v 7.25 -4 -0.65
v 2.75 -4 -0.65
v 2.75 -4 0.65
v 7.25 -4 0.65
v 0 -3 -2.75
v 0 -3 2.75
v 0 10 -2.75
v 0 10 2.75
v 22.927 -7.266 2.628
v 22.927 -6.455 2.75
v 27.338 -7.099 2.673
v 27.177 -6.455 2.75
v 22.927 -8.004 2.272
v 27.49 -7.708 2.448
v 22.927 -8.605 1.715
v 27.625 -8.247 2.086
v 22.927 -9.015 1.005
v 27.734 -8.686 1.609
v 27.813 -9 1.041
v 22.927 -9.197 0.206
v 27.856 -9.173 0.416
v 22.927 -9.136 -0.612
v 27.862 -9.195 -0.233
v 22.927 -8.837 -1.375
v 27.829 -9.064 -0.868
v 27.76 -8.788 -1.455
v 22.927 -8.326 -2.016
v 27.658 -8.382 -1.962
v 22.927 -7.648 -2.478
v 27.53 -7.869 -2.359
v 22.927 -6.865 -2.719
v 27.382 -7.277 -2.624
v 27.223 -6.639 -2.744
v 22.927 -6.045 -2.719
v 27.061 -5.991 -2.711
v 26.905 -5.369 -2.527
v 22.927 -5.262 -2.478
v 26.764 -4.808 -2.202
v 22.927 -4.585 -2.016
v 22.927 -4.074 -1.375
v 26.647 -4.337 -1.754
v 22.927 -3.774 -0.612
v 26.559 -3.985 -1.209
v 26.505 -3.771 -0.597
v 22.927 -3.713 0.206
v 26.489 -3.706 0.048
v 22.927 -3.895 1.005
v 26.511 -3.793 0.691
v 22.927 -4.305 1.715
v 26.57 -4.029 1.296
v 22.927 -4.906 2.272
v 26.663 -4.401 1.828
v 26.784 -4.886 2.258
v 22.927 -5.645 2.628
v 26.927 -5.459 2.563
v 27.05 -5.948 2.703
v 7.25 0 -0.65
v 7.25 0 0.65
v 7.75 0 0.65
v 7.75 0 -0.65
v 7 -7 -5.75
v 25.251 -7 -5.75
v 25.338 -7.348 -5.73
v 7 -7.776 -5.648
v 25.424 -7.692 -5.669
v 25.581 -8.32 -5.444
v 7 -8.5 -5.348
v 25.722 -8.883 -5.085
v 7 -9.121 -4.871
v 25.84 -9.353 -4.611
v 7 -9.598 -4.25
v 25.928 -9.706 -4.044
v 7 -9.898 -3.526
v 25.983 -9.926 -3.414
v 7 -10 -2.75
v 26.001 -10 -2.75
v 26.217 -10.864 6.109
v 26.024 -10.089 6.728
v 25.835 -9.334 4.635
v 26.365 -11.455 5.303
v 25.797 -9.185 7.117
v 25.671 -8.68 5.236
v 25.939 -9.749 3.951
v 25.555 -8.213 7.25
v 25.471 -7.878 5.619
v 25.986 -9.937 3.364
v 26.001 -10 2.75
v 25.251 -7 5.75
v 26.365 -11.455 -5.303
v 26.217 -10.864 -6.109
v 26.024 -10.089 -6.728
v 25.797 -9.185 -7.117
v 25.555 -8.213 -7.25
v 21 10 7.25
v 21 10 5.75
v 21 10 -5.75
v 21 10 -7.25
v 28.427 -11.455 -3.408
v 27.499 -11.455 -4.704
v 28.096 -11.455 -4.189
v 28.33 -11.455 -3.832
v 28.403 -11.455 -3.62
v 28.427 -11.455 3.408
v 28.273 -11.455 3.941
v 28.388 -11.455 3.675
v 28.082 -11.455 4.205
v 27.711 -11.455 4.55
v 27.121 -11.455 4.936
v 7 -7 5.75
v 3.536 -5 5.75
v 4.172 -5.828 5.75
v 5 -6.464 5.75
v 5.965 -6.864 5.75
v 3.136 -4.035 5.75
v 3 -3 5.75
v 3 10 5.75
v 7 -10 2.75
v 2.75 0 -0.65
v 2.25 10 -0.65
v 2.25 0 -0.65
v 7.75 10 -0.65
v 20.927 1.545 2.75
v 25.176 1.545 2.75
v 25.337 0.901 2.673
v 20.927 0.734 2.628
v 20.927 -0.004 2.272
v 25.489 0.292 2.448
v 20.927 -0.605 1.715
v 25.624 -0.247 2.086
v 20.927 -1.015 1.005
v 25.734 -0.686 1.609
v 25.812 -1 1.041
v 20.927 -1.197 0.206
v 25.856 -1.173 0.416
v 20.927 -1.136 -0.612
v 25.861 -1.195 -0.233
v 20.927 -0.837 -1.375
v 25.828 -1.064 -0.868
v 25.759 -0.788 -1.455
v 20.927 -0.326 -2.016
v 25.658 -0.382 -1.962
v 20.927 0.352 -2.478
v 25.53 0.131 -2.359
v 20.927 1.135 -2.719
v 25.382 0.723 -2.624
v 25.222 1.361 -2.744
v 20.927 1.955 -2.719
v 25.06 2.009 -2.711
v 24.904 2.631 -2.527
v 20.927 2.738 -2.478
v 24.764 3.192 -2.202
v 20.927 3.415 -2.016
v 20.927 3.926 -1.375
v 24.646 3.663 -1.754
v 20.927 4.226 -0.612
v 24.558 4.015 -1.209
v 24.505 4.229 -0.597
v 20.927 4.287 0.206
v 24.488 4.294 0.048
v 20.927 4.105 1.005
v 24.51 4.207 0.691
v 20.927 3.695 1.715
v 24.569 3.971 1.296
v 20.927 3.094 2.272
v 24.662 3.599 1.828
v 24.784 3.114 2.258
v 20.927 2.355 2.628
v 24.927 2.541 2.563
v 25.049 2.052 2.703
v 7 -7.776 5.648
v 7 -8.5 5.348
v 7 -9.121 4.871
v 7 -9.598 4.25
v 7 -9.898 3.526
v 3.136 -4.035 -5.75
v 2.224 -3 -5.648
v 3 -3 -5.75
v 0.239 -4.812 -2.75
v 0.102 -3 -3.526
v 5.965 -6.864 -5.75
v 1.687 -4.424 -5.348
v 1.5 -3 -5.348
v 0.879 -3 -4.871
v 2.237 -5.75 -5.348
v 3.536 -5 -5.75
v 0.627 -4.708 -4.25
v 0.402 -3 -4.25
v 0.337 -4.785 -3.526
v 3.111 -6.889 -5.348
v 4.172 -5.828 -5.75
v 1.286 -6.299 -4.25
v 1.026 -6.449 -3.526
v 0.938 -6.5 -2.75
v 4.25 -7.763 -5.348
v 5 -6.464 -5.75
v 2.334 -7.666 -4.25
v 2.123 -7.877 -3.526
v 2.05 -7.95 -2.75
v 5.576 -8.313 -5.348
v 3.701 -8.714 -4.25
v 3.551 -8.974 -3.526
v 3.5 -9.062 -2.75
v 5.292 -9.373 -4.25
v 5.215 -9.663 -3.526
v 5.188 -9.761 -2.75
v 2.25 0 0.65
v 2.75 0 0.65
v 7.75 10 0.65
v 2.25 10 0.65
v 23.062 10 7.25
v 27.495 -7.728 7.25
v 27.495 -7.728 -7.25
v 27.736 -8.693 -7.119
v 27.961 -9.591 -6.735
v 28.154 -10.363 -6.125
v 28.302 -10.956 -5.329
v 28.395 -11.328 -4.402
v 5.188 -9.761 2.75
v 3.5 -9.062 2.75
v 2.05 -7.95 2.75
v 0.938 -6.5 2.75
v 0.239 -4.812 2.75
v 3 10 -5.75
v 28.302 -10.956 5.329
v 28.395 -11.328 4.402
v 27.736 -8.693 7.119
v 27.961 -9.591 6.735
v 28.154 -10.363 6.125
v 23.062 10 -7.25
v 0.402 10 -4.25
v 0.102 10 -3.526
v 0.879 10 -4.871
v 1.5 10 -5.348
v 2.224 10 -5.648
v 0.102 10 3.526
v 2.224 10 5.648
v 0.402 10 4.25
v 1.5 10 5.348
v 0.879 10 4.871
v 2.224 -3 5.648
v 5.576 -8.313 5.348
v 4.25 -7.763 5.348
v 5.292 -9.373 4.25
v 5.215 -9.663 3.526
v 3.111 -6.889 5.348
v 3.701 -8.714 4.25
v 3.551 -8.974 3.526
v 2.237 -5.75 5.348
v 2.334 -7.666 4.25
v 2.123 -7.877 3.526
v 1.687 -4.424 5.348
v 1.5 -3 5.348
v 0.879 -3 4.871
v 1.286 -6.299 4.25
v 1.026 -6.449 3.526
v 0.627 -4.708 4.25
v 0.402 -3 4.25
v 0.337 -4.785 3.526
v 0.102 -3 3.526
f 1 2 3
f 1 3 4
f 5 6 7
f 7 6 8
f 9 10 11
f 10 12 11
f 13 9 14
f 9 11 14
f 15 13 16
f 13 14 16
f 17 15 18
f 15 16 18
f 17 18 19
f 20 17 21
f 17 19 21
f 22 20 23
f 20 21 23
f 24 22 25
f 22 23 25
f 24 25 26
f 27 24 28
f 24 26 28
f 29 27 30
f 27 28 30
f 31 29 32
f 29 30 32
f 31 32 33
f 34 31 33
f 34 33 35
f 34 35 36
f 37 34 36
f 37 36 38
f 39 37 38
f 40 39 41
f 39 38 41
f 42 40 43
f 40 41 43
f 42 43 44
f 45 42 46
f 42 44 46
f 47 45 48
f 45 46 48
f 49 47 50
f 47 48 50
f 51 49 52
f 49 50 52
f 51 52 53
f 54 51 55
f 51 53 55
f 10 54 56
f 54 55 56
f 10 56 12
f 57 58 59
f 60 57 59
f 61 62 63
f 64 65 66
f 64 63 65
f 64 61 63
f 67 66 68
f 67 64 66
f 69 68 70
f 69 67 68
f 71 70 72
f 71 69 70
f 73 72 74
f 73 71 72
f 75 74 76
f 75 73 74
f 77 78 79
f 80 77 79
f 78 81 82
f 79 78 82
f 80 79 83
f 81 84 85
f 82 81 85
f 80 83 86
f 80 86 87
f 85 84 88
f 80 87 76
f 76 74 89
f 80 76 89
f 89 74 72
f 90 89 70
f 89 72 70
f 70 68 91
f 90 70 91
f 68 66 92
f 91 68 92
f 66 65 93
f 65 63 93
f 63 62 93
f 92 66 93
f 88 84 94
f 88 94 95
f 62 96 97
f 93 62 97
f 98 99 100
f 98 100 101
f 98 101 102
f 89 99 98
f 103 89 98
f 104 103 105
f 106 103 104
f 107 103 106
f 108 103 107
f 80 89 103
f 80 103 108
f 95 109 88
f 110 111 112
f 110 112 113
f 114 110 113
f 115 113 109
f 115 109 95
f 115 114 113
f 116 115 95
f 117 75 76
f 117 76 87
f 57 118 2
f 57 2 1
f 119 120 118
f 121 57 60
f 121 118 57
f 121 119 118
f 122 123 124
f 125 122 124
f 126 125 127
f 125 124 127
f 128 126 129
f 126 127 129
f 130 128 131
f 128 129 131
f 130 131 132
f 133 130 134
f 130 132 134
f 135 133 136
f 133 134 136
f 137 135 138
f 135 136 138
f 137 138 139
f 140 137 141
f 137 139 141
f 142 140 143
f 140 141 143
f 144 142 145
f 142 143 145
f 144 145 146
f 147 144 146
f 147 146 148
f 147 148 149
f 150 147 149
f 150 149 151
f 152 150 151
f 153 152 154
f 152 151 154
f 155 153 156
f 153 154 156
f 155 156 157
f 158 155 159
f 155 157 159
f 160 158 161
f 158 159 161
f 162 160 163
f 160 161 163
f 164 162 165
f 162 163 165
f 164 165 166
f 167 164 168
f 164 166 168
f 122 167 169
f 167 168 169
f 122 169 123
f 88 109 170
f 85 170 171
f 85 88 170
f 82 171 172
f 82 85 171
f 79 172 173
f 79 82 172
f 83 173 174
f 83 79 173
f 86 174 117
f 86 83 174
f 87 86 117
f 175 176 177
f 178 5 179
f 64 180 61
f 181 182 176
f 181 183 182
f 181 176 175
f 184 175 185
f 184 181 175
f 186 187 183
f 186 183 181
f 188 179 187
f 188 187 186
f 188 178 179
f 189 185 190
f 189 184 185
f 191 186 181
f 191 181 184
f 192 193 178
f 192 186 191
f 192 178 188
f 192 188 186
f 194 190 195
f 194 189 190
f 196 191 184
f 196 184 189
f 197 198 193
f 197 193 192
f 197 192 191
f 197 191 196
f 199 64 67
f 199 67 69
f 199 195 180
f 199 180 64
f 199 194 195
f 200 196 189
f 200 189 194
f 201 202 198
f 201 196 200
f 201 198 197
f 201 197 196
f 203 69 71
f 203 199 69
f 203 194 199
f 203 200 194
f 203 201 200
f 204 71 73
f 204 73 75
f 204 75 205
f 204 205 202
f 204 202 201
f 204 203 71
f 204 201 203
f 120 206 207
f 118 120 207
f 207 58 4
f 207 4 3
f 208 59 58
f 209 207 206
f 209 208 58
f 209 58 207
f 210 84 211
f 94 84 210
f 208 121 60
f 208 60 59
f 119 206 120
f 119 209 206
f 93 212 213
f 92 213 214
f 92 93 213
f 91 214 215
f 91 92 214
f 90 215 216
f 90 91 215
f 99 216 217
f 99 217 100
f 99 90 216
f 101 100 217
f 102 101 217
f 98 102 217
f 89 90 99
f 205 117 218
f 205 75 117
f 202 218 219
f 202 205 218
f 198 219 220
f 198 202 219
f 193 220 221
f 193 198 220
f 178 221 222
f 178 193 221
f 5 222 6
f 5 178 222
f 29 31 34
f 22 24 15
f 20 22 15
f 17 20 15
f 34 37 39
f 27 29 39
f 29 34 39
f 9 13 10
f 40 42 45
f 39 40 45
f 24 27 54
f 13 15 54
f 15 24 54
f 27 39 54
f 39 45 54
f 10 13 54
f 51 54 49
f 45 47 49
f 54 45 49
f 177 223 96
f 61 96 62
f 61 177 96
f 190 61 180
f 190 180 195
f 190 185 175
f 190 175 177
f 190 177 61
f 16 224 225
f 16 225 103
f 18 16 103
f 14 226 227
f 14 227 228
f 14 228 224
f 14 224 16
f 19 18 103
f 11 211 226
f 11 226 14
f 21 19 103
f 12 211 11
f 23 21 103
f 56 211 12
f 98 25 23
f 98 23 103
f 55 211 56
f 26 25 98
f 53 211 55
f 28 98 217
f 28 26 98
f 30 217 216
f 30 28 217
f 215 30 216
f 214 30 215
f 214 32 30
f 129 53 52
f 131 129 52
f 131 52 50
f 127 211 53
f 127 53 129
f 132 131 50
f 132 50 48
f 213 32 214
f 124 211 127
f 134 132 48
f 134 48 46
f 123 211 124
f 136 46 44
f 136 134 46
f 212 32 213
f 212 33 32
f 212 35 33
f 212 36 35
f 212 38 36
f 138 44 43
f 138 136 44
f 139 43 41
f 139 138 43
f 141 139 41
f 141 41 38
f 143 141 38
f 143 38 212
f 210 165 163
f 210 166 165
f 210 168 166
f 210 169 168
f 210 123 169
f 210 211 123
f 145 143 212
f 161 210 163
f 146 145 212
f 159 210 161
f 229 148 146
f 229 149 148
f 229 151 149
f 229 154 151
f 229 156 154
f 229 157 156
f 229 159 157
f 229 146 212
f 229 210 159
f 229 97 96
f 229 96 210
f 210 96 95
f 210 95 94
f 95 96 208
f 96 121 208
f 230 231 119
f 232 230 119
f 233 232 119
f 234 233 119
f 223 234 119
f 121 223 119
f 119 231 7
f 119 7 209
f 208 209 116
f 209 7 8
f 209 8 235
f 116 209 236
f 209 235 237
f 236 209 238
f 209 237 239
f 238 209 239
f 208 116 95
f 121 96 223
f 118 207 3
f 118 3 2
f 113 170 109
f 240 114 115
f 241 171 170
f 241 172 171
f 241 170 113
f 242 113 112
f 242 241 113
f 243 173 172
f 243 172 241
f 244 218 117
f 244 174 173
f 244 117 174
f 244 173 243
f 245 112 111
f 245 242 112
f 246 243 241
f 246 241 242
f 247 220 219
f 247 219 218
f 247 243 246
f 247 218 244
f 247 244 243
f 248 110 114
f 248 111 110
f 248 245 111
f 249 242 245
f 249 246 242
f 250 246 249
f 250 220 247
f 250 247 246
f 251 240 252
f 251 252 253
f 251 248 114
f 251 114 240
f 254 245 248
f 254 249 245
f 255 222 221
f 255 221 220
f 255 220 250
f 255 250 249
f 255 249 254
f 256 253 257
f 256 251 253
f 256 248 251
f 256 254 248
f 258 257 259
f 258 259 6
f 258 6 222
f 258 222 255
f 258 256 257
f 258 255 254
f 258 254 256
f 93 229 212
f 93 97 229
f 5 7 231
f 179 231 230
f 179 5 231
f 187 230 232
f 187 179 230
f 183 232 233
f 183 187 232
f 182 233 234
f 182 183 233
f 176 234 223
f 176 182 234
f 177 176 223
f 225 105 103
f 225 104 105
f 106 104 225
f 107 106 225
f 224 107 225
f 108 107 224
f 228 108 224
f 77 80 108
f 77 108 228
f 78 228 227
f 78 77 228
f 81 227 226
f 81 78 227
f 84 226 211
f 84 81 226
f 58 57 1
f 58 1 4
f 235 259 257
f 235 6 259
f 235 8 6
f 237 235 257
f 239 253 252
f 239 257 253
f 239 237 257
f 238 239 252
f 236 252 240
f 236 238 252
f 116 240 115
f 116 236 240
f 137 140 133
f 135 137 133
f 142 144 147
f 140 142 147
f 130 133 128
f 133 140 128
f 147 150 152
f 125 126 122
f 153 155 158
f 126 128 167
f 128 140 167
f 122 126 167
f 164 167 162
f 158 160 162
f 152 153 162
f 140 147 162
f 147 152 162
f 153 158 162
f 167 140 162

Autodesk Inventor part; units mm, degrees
ref_plane "YZ Plane" through (0, 0, 0) normal (1, 0, 0) x (0, 1, 0)
sketch "Sketch1" plane through (0, 0, 0) normal (1, 0, 0) x (0, 1, 0)
  line L0 (-10, 5.75) -> (10, 5.75)
  line L1 (10, 5.75) -> (10, -5.75)
  line L2 (10, -5.75) -> (-10, -5.75)
  line L3 (-10, -5.75) -> (-10, 5.75)
  line L4 (-10, 5.75) -> (10, -5.75) construction
  line L5 (10, 5.75) -> (-10, -5.75) construction
  point P0 (0, 0)
  dimension "d0" = 20
  dimension "d1" = 11.5
extrude "Extrusion1" add sketch "Sketch1" along normal blind 21
ref_plane "Work Plane1" through (21, 10, -5.75) normal (0.9701266, 0.2425992, 0) x (0, 0, 1)
sketch "Sketch2" plane through (0, 10, 5.75) normal (0, 1, 0) x (1, 0, 0)
  line L0 (7.75, 5.1) -> (2.25, 5.1)
  line L1 (2.25, 5.1) -> (2.25, 6.4)
  line L2 (2.25, 6.4) -> (7.75, 6.4)
  line L3 (7.75, 6.4) -> (7.75, 5.1)
  line L4 (7.75, 5.1) -> (2.25, 6.4) construction
  line L5 (2.25, 5.1) -> (7.75, 6.4) construction
  line L6 (7.25, 5.1) -> (2.75, 5.1)
  line L7 (2.75, 5.1) -> (2.75, 6.4)
  line L8 (2.75, 6.4) -> (7.25, 6.4)
  line L9 (7.25, 6.4) -> (7.25, 5.1)
  line L10 (7.25, 5.1) -> (2.75, 6.4) construction
  line L11 (2.75, 5.1) -> (7.25, 6.4) construction
  line L12 (0, 11.5) -> (0, 0) construction
  point P0 (0, 5.75)
  point P1 (5, 5.75)
  point P2 (5, 5.75)
  point P3 (7.25, 5.1)
  point P4 (2.75, 5.1)
  point P5 (0, 5.75)
  dimension "d4" = 5.5
  dimension "d5" = 1.3
  dimension "d6" = 4.5
  dimension "d20" = 5
extrude "Extrusion2" cut sketch "Sketch2" against normal blind 10
extrude "Extrusion3" cut sketch "Sketch2" against normal blind 14 contours L0 L7 L2 L9
fillet "Fillet1" radius 3 4 edges at (0, 0, 5.75) (10.5, -10, 5.75) (10.5, -10, -5.75) (0, 0, -5.75)
fillet "Fillet2" radius 7 3 edges at (0.8787, -9.1213, -4.8713) (0.8787, -9.1213, 4.8713) (0, -10, 0)
sketch "Sketch4" plane through (21, 0, 0) normal (1, 0, 0) x (0, 0, -1)
  arc A0 (2.75, -10) -> (5.75, -7) centre (2.75, -7) ccw projected
  line L0 (5.75, -7) -> (5.75, 10) projected
  line L1 (5.75, 10) -> (-5.75, 10) projected
  line L2 (-5.75, 10) -> (-5.75, -7) projected
  arc A1 (-5.75, -7) -> (-2.75, -10) centre (-2.75, -7) ccw projected
  line L3 (-2.75, -10) -> (2.75, -10) projected
  point P0 (0, 0)
extrude "Extrusion5" add sketch "Sketch4" along normal up to surface surface through (21, 10, -5.75) normal (0.9701266, 0.2425992, 0)
sketch "Sketch6" plane through (21, 10, 5.75) normal (0.9701266, 0.2425992, 0) x (0, 0, -1)
  line L0 (11.5, 0) -> (11.5, -17.5235) projected
  line L1 (11.5, 0) -> (0, 0) projected
  line L2 (0, -17.5235) -> (0, 0) projected
  line L3 (8.5, -20.6159) -> (3, -20.6159) projected
  line L4 (-1.5, 0) -> (13, 0)
  line L5 (13, 0) -> (13, -18.7739)
  line L6 (9.158, -22.6159) -> (2.342, -22.6159)
  line L7 (-1.5, -18.7739) -> (-1.5, 0)
  arc A0 (-1.5, -18.7739) -> (2.342, -22.6159) centre (2.342, -18.7739) ccw
  arc A1 (9.158, -22.6159) -> (13, -18.7739) centre (9.158, -18.7739) ccw
  point P0 (5.75, -4.6067)
  dimension "d21" = 1.5
  dimension "d22" = 1.5
  dimension "d23" = 2
  dimension "d24" = 3.842
extrude "Extrusion6" add sketch "Sketch6" along normal blind 2
sketch "Sketch7" plane through (0, 0, 0) normal (-1, 0, 0) x (0, 0, 1)
  line L0 (7.25, 10.4852) -> (7.25, -7.7278) construction
  line L1 (-7.6184, 10) -> (7.25, 10)
  line L2 (7.25, 10) -> (7.25, 10.4852)
  line L3 (7.25, 10.4852) -> (-7.6184, 10.4852)
  line L4 (-7.6184, 10.4852) -> (-7.6184, 10)
  line L5 (3.408, -11.4551) -> (-3.408, -11.4551) construction
  line L6 (-3.408, -11.4551) -> (7.25, -11.4551)
  line L7 (7.25, -11.4551) -> (7.25, -13.162)
  line L8 (7.25, -13.162) -> (-3.408, -13.162)
  line L9 (-3.408, -13.162) -> (-3.408, -11.4551)
  line L10 (-3.408, -11.4551) -> (-7.4388, -11.4551)
  line L11 (-7.4388, -11.4551) -> (-7.4388, -13.1256)
  line L12 (-7.4388, -13.1256) -> (-3.408, -13.1256)
  line L13 (-3.408, -13.1256) -> (-3.408, -11.4551)
  point P0 (0, 0)
  point P1 (-2.75, 10)
extrude "Extrusion7" cut sketch "Sketch7" against normal through all
ref_plane "Work Plane2" through (28.427, 0, 0) normal (-1, 0, 0) x (0, 0, 1)
sketch "Sketch8" plane through (28.427, 0, 0) normal (-1, 0, 0) x (0, 0, 1)
  circle A0 centre (0, 1.5449) radius 2.75
  circle A1 centre (0, -6.4551) radius 2.75
  line L0 (3.408, -11.4551) -> (-3.408, -11.4551) construction
  point P0 (0, 0)
  dimension "d30" = 5.5
  dimension "d31" = 5.5
  dimension "d36" = 8
  dimension "d37" = 5
extrude "Extrusion8" cut sketch "Sketch8" along normal blind 5.5 contours A1
extrude "Extrusion9" cut sketch "Sketch8" along normal blind 7.5 contours A0
properties part number "buton" material "PBT Plastic"
